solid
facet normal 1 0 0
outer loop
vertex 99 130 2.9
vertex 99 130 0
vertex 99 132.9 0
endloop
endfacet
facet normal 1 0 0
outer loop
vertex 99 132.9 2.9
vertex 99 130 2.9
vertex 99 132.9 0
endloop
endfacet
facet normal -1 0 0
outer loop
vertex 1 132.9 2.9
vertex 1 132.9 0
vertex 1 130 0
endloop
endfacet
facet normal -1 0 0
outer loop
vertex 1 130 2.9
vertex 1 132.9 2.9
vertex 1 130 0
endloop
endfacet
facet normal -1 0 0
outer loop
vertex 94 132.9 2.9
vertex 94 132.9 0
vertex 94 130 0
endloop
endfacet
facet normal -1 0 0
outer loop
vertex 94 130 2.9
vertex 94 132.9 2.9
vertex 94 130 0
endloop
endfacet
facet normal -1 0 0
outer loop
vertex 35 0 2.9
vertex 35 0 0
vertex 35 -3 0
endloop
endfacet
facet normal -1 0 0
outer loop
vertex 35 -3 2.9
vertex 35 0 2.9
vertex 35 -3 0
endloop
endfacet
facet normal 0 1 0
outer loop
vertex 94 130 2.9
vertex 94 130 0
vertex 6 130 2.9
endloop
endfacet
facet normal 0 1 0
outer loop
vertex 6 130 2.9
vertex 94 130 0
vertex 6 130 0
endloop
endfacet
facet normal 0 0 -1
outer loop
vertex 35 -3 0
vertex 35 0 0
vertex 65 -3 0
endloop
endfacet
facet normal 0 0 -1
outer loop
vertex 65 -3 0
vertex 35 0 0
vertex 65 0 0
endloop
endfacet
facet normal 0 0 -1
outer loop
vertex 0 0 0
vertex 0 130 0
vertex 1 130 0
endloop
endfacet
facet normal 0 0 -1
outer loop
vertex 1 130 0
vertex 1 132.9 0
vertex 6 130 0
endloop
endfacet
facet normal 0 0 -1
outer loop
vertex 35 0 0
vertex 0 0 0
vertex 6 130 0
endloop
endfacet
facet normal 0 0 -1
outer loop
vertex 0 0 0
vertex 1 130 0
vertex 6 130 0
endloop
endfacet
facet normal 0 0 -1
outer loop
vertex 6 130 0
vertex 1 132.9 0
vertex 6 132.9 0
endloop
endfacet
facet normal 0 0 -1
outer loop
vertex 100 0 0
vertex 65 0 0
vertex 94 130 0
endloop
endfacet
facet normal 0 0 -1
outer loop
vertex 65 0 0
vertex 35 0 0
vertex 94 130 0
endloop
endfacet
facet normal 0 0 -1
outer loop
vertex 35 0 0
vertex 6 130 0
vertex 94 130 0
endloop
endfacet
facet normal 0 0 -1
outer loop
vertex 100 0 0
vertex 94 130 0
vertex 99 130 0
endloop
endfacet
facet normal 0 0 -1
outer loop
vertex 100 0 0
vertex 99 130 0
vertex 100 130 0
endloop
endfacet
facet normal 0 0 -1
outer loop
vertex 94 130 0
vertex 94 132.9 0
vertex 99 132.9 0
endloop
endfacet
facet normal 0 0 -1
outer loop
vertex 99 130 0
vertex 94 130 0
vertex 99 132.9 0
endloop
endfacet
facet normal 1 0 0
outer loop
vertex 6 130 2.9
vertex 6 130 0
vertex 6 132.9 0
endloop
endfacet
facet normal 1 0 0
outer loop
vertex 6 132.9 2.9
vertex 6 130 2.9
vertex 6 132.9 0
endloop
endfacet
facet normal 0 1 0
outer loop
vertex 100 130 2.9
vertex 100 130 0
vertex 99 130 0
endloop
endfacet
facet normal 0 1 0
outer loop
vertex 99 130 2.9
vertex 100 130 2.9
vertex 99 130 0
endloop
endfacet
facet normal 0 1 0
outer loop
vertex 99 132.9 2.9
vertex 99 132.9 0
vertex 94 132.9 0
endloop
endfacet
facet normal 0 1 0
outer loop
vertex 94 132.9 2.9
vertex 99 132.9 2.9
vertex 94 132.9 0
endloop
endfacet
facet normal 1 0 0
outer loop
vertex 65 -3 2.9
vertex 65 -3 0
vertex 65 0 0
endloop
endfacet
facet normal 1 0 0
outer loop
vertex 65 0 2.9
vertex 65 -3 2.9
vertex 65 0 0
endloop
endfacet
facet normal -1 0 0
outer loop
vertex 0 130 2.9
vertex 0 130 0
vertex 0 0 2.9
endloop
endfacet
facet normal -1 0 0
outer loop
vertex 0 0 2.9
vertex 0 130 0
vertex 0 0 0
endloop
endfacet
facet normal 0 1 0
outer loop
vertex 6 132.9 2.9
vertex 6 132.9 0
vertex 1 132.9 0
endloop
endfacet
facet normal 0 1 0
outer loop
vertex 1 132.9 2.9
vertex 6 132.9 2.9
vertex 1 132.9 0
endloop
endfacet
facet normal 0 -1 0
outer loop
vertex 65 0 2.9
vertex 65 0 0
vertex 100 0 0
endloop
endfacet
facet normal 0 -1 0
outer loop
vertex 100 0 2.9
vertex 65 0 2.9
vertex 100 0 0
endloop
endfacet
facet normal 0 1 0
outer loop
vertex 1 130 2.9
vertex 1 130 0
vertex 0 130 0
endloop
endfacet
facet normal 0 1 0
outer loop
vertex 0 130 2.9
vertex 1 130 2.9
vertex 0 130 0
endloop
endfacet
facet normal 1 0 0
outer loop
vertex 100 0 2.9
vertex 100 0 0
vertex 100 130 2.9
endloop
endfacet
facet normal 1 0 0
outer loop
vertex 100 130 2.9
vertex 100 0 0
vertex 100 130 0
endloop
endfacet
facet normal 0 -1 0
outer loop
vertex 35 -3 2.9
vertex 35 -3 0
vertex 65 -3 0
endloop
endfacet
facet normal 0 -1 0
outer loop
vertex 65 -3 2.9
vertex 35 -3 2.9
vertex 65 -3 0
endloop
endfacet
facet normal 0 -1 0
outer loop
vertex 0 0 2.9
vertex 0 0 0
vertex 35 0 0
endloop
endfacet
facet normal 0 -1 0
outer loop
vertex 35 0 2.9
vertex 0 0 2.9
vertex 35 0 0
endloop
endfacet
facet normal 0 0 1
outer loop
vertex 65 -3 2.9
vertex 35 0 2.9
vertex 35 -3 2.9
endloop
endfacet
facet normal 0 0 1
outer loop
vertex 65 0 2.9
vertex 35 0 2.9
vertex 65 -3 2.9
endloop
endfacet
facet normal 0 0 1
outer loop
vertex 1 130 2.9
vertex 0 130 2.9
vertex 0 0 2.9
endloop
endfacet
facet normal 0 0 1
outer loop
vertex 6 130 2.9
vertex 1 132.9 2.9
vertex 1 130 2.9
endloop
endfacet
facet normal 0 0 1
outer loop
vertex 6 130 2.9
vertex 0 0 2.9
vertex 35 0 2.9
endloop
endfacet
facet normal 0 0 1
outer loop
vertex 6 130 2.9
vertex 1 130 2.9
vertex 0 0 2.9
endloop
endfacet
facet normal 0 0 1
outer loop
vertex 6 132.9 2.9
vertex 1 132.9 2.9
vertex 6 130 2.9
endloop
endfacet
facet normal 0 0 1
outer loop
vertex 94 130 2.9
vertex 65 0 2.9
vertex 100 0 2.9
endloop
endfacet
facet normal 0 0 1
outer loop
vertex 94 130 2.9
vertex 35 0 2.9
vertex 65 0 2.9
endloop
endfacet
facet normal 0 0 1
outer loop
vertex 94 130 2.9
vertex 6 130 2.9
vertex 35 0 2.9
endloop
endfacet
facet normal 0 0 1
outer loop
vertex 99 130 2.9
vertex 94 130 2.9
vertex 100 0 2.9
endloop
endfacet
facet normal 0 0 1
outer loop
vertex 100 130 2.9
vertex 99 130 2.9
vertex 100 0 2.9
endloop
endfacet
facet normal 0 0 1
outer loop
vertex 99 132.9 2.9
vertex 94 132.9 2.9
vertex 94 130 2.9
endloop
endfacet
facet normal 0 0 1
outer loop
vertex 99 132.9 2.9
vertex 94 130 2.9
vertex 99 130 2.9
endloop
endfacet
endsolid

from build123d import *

# Parameters (mm, degrees)
EXTRUDE_1_DEPTH = 2.9


with BuildPart() as part:
    # 草图1 → 凸台-拉伸1 (new body)
    with BuildSketch(Plane.XY):
        Polygon((65, 0), (100, 0), (100, 130), (99, 130), (99, 132.9), (95, 132.9), (94, 132.9), (94, 130), (6, 130), (6, 132.9), (5, 132.9), (1, 132.9), (1, 130), (0, 130), (0, 0), (35, 0), (35, -3), (50, -3), (65, -3), align=None)
    extrude(amount=EXTRUDE_1_DEPTH)


solid = part.part
